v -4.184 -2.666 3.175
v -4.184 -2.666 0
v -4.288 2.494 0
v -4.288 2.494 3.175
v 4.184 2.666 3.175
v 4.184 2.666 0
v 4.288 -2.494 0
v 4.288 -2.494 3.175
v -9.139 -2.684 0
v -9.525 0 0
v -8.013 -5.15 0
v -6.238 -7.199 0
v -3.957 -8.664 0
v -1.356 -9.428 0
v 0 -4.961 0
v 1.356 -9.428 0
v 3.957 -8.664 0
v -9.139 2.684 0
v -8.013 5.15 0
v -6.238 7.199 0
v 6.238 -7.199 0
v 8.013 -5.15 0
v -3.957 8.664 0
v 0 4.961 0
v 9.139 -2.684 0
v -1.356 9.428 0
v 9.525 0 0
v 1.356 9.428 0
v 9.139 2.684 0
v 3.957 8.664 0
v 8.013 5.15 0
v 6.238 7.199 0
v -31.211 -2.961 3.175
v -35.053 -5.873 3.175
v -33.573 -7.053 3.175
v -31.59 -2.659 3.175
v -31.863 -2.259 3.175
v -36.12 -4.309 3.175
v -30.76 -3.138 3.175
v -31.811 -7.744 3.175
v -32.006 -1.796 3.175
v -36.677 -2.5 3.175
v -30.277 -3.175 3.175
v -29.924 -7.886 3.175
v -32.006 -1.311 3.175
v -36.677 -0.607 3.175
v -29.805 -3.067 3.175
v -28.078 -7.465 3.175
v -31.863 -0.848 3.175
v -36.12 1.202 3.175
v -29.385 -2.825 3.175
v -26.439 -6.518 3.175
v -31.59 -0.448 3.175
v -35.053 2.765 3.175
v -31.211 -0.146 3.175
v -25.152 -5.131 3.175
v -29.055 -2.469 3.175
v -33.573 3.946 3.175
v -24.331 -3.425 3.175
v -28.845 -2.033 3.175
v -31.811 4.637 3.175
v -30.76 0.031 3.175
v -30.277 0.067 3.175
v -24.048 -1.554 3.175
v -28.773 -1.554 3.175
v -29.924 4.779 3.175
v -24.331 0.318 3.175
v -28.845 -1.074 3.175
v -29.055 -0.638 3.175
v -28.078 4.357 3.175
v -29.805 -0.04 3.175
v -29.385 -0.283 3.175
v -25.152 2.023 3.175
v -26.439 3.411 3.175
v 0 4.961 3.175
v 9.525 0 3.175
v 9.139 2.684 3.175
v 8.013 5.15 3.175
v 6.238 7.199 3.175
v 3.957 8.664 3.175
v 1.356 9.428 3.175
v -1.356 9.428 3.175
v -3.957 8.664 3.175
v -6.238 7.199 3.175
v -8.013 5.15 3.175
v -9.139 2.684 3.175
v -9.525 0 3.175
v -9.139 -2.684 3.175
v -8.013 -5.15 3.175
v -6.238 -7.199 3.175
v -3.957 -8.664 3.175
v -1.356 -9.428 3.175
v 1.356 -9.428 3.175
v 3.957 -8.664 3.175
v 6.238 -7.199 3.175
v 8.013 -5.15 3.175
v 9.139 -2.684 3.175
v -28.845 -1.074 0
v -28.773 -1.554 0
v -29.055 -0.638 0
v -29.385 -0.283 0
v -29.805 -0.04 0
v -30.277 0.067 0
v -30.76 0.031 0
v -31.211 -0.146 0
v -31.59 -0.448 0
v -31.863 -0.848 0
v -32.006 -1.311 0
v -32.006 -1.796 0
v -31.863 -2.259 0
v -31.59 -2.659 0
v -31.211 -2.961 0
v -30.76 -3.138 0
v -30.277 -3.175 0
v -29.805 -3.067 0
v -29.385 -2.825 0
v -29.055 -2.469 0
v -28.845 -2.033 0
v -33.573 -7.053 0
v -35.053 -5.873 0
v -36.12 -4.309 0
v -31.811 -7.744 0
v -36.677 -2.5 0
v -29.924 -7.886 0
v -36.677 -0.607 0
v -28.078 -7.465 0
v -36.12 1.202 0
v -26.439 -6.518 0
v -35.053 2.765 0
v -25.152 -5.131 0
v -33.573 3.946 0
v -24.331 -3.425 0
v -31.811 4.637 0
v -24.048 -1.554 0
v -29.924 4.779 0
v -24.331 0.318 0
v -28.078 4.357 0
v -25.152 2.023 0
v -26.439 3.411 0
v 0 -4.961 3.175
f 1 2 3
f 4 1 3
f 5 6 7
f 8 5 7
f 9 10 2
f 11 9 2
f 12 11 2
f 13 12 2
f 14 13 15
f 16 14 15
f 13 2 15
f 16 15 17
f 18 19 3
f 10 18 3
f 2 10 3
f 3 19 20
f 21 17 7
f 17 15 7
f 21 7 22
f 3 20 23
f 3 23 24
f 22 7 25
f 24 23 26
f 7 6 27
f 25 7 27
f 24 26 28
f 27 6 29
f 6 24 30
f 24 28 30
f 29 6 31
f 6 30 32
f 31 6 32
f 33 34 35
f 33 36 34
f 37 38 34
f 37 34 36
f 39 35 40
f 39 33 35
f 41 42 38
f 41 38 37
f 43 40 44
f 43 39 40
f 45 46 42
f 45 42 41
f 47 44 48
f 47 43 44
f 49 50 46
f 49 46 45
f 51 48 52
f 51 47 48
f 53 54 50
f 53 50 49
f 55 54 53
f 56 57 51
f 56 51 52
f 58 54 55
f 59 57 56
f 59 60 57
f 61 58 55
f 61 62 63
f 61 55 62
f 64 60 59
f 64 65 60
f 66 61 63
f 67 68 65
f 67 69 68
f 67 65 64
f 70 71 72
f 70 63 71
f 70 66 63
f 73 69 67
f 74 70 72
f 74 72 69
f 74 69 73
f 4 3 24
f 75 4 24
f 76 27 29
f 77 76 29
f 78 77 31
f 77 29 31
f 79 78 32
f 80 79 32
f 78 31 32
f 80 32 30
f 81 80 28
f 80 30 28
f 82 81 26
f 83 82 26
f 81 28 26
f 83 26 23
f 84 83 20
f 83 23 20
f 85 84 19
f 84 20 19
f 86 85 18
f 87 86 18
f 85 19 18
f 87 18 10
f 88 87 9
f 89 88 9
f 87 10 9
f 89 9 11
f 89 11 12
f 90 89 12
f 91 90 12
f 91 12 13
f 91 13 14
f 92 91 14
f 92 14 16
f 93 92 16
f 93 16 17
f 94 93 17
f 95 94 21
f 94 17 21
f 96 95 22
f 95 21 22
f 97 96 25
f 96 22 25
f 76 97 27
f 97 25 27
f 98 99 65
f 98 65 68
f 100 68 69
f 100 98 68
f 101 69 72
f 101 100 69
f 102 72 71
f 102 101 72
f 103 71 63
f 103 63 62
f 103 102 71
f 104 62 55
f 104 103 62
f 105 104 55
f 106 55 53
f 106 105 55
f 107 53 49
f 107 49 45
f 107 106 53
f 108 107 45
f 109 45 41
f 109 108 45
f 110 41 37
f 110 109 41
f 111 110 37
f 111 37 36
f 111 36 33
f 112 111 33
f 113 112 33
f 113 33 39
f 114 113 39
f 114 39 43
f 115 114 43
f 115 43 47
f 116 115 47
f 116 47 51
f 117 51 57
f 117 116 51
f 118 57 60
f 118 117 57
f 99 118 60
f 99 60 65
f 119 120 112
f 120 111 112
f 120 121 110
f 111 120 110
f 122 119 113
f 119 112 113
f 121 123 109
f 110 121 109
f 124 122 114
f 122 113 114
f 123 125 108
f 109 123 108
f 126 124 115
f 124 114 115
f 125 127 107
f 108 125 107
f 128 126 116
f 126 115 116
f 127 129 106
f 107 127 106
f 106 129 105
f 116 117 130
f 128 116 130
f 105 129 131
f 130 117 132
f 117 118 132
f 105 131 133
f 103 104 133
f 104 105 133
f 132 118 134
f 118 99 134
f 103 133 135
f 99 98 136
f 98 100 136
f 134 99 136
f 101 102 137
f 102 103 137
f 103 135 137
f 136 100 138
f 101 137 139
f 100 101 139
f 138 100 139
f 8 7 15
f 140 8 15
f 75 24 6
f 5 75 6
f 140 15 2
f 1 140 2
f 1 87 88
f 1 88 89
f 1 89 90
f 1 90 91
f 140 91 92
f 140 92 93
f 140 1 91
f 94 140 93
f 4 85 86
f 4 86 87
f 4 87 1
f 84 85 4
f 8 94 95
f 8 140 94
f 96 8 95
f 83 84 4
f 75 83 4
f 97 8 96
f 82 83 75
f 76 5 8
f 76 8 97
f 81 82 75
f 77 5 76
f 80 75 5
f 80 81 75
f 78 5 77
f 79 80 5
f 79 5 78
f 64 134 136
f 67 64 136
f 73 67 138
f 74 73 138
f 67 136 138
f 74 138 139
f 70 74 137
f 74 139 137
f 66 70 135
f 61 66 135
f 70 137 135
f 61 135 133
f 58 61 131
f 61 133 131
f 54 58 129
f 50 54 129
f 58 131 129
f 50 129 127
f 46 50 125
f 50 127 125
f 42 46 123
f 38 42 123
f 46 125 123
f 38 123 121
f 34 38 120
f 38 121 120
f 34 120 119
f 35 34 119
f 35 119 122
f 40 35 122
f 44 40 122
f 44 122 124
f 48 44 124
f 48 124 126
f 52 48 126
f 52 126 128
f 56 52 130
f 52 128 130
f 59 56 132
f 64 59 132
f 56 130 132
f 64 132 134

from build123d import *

# Parameters (mm, degrees)
F0_R     = 6.35
F0_R_2   = 1.6256
F1_DEPTH = 3.175
F0_R_3   = 9.525


# Not quite as in the source:
# - a length typed as a fraction of an inch, garbled in the dataset ("3 / 203.2 mm" for 3/8 in), is restored


with BuildPart() as f1:
    # F0 (on Top) → F1 (new body)
    with BuildSketch(Plane.XY):
        with Locations((-30.3984060884, -1.5536330175)):
            Circle(F0_R)
        with Locations((-30.3984060884, -1.5536330175)):
            Circle(F0_R_2, mode=Mode.SUBTRACT)
    extrude(amount=F1_DEPTH)


with BuildPart() as f1b:
    # F0 (on Top) → F1, piece 2 (new body)
    with BuildSketch(Plane.XY):
        Circle(F0_R_3)
        Polygon((-4.1838677777, -2.6657365395), (-4.2884325113, 2.4940423964), (0, 4.9609375), (4.1838677777, 2.6657365395), (4.2884325113, -2.4940423964), (0, -4.9609375), align=None, mode=Mode.SUBTRACT)
    extrude(amount=F1_DEPTH)


solid = Compound([f1.part, f1b.part])
